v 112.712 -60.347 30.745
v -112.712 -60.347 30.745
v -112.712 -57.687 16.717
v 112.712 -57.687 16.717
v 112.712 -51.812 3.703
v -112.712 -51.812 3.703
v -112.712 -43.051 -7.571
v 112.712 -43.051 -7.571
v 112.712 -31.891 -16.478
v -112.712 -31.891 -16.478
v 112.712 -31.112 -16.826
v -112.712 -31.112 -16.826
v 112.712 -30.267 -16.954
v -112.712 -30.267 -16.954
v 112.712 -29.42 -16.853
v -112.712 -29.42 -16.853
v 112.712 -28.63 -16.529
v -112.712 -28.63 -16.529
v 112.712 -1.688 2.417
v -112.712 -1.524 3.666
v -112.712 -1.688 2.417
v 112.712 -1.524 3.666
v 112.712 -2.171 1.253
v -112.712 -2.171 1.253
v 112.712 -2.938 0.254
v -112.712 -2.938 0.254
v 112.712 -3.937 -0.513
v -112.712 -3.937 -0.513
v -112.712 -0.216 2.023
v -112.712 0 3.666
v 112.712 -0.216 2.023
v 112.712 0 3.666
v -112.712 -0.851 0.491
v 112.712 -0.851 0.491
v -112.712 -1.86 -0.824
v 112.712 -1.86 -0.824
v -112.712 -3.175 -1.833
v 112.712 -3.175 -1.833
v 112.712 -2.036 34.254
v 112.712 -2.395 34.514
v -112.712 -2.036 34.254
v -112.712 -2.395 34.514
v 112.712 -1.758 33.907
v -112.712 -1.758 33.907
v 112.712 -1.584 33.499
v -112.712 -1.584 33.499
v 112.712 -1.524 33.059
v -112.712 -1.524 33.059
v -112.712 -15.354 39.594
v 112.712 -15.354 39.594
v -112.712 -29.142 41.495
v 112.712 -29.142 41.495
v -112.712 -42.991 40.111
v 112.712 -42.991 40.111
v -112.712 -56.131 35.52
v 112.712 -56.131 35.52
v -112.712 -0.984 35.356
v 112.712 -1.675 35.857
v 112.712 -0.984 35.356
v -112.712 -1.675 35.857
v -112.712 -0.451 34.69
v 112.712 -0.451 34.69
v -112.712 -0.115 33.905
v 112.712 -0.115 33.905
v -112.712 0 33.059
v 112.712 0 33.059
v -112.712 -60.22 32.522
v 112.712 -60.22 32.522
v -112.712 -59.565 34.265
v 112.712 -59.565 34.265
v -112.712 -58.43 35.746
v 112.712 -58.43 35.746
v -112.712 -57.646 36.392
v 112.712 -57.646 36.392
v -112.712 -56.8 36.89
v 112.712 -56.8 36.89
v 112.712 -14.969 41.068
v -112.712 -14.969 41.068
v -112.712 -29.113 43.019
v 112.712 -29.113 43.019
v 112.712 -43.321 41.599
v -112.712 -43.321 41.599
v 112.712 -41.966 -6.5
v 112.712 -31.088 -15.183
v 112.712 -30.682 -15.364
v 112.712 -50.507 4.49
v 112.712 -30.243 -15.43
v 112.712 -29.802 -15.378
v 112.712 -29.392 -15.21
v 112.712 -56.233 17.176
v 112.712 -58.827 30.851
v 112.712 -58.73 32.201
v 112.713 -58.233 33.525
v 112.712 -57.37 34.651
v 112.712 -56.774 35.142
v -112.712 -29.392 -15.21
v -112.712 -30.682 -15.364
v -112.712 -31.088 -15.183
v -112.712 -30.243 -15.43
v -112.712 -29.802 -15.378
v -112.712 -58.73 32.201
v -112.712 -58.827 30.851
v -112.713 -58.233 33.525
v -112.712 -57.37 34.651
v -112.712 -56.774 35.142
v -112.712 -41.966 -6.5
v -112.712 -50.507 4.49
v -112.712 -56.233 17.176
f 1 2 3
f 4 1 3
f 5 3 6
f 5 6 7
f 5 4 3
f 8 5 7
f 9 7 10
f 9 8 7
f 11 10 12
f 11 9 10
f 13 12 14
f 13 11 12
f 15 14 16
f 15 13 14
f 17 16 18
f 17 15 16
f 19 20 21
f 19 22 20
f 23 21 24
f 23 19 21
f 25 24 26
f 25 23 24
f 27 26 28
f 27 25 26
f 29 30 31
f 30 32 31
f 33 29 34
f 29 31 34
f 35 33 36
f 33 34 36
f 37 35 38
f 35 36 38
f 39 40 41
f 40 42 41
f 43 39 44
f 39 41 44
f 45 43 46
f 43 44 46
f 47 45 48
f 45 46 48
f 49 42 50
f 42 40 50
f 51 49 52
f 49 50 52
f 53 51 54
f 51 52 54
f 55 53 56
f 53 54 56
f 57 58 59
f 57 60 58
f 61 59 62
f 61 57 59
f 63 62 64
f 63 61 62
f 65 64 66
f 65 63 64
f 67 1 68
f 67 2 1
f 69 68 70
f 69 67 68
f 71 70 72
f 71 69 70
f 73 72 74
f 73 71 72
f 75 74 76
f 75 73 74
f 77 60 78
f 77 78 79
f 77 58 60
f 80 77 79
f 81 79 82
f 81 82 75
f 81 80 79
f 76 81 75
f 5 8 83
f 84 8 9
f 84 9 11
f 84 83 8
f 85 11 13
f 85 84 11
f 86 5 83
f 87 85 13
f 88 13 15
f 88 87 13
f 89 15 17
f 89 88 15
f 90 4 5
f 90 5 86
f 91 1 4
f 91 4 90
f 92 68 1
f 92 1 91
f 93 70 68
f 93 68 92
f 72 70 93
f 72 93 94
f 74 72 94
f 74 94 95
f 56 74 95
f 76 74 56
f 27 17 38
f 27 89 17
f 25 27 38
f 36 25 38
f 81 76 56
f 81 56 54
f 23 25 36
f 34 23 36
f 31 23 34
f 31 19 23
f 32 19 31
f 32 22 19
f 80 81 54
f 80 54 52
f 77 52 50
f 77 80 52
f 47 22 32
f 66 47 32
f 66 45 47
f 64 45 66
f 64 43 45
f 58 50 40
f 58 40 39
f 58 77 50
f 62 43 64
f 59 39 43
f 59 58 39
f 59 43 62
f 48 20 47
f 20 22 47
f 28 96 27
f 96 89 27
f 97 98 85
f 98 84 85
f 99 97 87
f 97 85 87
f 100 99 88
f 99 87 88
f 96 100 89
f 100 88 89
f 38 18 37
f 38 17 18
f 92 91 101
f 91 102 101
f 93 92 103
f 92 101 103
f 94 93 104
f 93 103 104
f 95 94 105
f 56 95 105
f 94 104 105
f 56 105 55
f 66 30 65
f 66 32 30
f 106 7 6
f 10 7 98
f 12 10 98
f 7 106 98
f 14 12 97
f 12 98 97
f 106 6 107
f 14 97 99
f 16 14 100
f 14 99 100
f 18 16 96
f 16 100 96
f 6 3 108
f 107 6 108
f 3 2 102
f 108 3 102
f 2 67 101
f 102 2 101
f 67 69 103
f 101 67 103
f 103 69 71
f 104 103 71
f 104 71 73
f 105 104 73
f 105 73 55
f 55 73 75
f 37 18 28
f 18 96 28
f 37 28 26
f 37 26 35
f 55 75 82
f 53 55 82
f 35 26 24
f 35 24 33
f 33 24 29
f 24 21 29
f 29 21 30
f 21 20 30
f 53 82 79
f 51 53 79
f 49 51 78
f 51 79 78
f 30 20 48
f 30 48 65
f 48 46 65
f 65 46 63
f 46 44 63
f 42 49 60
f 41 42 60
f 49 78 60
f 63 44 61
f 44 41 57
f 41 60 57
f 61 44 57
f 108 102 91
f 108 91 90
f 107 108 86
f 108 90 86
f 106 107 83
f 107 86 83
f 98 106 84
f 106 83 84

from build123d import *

# Parameters (mm, degrees)
F1_DEPTH = 112.7125
F2_R     = 6.35
F3_R     = 3.175
F4_T     = -1.524


with BuildPart() as f1:
    # F0 (on Right) → F1 (new body, symmetric)
    with BuildSketch(Plane.YZ):
        with BuildLine():
            ThreePointArc((-60.491874, 34.925), (-52.3875, 4.679063), (-30.245937, -17.4625))
            Line((-30.245937, -17.4625), (0, 0))
            Line((0, 0), (0, 34.925))
            ThreePointArc((0, 34.925), (-30.245937, 43.029374), (-60.491874, 34.925))
        make_face()
    extrude(amount=F1_DEPTH, both=True)

    # F2
    f2_edges = [f1.edges().sort_by_distance(p)[0] for p in [
        (0, -60.491874, 34.925),
        (0, 0, 0),
    ]]
    fillet(f2_edges, radius=F2_R)

    # F3
    f3_edges = [f1.edges().sort_by_distance(p)[0] for p in [
        (0, 0, 34.925),
        (0, -30.245937, -17.4625),
    ]]
    fillet(f3_edges, radius=F3_R)

    # F4
    f4_openings = [f1.faces().sort_by_distance(p)[0] for p in [
        (-112.7125, -28.547695, 16.482019),
        (112.7125, -28.547695, 16.482019),
    ]]
    offset(amount=F4_T, openings=f4_openings)


solid = f1.part
